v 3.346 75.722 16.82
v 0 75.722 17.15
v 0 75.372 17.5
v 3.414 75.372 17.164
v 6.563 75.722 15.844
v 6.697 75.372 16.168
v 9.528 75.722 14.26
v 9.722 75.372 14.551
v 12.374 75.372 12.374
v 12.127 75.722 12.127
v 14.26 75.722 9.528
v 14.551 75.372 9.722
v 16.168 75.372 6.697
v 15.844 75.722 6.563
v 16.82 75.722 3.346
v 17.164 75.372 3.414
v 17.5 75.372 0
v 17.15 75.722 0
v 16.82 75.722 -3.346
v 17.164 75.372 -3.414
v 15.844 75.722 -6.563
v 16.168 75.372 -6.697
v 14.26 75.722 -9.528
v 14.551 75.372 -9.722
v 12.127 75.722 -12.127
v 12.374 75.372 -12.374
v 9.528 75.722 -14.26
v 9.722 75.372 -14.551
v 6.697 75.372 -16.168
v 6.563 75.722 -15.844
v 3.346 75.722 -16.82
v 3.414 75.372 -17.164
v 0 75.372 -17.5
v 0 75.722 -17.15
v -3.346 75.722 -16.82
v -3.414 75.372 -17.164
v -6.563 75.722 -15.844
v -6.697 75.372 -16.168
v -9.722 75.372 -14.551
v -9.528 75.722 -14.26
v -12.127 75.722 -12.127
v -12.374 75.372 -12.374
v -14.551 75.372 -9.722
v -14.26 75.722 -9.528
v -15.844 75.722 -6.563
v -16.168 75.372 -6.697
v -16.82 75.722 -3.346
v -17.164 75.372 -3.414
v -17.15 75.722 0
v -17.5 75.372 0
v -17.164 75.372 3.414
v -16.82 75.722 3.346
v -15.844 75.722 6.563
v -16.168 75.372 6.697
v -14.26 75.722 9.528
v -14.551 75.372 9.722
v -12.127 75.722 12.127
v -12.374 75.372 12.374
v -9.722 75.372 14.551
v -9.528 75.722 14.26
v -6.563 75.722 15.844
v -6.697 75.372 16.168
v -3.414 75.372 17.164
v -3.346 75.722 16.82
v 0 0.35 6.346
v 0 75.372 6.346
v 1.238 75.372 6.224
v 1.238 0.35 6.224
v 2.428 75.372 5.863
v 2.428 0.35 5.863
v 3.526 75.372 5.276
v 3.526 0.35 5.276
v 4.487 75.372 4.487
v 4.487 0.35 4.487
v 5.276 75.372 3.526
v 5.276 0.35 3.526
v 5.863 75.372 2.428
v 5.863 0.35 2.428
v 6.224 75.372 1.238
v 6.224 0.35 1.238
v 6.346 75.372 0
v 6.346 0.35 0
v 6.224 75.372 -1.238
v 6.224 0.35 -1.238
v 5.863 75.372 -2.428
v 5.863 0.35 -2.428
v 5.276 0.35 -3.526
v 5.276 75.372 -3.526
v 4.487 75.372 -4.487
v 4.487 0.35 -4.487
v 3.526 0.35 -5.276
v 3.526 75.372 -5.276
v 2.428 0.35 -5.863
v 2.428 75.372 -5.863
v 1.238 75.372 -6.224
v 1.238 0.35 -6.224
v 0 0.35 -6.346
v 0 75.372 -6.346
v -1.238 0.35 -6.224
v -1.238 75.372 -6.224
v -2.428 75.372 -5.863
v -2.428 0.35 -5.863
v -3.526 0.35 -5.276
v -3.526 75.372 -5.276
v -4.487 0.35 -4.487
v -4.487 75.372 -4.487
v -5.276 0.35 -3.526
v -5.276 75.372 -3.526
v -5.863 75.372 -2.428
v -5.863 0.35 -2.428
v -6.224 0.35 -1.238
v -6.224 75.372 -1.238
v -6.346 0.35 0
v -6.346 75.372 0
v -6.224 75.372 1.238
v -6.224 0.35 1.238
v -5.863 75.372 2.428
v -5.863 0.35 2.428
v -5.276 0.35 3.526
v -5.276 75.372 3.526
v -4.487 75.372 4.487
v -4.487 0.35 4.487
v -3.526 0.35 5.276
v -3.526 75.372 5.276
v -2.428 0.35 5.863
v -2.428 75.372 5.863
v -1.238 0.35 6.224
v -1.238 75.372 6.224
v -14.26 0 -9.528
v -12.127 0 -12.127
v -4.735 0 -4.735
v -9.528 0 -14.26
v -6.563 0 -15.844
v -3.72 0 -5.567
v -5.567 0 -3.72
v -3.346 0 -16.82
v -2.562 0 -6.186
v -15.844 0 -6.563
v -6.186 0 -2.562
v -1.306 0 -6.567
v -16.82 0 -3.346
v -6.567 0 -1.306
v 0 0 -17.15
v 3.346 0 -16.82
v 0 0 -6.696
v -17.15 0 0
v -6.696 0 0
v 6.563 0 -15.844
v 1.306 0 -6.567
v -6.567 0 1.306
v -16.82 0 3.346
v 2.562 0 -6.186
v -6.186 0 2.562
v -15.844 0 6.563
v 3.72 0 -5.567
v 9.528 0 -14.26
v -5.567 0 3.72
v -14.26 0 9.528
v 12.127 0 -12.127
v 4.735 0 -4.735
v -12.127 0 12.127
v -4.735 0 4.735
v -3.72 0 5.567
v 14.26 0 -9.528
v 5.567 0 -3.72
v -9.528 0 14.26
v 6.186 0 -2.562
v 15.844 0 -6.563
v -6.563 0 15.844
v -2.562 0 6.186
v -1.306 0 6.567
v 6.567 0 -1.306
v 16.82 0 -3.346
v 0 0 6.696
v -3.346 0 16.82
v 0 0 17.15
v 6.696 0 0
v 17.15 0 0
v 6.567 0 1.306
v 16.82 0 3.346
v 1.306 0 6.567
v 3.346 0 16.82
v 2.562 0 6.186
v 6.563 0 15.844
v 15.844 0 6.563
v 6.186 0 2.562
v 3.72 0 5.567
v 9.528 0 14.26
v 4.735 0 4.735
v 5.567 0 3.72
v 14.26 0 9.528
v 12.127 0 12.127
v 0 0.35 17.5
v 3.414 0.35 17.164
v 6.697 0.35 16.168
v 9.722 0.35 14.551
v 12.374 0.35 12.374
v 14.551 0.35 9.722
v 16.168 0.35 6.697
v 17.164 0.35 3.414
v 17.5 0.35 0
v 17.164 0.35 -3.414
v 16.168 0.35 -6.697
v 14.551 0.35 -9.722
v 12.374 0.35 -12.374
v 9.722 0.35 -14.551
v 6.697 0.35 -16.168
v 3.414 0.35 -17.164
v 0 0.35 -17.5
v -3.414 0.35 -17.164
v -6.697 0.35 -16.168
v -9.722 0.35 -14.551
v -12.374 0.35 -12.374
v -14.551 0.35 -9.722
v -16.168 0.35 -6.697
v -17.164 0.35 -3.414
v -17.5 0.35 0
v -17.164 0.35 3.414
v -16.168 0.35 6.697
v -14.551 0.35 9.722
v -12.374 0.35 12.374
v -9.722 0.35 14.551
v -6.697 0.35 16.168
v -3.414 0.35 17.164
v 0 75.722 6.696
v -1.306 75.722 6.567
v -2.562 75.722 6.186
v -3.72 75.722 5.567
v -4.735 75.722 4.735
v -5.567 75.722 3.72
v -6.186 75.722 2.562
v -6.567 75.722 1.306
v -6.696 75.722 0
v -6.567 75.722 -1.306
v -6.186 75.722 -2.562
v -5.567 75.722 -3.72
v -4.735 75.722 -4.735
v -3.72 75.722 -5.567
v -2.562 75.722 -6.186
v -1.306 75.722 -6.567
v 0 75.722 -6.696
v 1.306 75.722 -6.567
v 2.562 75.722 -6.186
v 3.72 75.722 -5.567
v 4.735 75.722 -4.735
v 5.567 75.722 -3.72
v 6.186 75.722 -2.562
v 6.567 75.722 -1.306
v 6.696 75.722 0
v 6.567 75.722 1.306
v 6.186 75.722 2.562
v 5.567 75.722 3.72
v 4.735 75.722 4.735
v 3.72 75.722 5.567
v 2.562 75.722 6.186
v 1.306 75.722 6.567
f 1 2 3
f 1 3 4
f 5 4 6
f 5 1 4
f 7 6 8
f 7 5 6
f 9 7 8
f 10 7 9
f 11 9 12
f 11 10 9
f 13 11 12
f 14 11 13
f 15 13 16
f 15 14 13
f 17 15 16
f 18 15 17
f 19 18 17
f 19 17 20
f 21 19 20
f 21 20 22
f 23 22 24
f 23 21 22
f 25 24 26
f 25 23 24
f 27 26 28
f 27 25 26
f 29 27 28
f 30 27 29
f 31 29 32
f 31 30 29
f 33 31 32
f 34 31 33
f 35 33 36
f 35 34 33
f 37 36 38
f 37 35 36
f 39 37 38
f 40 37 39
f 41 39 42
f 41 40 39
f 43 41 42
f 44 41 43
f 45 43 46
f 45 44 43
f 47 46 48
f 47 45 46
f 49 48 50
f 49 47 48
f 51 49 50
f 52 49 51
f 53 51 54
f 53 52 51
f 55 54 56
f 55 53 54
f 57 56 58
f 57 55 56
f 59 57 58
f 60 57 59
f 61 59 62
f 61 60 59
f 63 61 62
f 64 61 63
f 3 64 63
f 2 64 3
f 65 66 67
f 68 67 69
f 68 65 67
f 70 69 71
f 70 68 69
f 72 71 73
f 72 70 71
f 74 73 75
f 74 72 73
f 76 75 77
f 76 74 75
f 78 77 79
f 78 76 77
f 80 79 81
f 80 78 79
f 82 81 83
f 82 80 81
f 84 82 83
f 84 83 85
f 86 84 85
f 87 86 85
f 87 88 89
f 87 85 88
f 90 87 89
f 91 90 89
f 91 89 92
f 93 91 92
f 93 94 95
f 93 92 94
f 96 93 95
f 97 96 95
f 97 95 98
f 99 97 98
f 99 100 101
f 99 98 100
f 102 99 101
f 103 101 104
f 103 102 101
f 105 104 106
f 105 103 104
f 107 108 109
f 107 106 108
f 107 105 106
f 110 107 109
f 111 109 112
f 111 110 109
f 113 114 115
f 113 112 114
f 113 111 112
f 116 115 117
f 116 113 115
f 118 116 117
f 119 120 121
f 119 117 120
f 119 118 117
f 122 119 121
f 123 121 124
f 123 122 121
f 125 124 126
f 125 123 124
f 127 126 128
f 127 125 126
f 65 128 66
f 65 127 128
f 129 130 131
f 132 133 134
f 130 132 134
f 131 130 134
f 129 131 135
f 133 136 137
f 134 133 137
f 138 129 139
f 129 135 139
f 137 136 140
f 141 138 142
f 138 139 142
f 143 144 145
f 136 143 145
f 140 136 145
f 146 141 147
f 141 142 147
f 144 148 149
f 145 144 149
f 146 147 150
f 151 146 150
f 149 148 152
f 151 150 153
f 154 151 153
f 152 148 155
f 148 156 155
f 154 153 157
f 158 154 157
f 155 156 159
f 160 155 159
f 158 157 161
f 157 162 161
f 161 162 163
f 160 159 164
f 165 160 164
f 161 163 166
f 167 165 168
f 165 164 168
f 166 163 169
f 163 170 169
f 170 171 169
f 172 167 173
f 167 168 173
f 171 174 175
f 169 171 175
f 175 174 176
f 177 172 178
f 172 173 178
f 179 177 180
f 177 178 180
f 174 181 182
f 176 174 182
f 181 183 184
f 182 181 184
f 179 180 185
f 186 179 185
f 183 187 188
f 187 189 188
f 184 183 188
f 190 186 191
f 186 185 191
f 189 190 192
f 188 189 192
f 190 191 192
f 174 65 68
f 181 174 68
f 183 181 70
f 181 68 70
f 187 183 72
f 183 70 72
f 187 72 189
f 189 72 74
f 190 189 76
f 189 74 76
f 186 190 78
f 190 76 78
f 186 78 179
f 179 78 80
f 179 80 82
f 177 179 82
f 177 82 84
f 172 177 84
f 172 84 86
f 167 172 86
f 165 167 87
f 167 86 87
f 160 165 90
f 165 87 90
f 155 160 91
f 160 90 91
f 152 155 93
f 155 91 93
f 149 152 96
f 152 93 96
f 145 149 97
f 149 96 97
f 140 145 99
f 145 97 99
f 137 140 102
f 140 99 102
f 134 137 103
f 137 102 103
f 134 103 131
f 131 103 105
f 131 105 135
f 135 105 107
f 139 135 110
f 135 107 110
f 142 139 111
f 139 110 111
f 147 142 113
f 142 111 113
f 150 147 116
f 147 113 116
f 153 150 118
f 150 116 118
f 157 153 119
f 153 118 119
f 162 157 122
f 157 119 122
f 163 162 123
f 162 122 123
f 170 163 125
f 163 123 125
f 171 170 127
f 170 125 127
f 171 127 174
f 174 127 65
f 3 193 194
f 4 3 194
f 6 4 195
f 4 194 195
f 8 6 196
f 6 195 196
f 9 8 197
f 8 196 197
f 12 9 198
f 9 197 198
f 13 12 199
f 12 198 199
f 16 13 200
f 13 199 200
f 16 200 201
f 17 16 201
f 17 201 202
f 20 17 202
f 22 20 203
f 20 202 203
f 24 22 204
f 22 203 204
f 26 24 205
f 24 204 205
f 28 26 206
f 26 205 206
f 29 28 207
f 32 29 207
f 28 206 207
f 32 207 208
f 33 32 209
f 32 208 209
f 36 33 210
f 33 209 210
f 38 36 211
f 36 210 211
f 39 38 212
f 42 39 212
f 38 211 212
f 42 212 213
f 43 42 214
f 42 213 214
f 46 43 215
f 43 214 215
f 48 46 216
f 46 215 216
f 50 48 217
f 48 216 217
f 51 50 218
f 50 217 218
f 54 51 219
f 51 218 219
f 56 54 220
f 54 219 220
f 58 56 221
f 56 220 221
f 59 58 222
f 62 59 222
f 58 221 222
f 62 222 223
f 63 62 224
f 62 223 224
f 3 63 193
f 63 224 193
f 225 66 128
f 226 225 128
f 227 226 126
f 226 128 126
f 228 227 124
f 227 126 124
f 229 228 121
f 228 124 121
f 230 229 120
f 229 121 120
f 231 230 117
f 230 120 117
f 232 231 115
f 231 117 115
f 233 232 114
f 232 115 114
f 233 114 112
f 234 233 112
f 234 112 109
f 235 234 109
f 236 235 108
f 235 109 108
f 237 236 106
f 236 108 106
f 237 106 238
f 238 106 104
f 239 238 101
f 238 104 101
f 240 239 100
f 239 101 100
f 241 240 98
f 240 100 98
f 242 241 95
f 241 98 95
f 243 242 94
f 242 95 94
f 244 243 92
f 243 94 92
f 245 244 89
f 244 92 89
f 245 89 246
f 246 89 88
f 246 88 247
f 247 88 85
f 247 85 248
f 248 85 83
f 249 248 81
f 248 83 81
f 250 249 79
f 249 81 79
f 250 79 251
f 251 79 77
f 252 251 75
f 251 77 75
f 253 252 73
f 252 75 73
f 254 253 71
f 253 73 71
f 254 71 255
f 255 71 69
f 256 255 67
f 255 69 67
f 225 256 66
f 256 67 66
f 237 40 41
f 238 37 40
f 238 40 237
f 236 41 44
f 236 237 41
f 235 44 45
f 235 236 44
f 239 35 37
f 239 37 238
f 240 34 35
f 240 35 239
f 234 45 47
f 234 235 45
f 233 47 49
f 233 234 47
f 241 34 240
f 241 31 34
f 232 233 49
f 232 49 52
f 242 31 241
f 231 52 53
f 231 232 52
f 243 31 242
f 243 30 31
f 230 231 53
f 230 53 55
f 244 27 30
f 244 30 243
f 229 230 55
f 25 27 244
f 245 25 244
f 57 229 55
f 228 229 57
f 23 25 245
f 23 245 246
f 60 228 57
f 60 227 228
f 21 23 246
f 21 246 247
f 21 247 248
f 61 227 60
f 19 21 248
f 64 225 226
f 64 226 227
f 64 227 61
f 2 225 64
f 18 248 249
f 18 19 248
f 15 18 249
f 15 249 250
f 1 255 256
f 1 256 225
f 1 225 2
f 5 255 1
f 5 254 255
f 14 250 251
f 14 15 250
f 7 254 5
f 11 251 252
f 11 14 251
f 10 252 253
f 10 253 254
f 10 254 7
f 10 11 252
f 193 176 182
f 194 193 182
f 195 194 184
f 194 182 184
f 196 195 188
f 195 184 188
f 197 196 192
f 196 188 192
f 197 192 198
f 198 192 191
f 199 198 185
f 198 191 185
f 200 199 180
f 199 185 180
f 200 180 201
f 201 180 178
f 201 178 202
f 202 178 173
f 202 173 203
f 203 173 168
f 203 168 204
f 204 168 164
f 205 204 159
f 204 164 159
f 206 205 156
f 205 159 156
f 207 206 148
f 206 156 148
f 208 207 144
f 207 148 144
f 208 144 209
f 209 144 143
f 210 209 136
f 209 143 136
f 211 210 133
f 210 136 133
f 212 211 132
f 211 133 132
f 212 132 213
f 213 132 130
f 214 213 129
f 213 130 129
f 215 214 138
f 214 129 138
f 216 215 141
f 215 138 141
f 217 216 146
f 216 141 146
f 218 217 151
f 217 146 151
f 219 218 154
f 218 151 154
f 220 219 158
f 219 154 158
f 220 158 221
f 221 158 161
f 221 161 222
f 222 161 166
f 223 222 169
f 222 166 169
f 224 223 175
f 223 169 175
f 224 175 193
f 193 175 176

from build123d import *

# Parameters (mm, degrees)
SKETCH1_R           = 17.5
BOSS_EXTRUDE1_DEPTH = 75.721727349
SKETCH2_R           = 6.345843567
CUT_EXTRUDE1_DEPTH  = 80.663542432
CHAMFER1_SIZE       = 0.350058037


with BuildPart() as part:
    # Sketch1 → Boss-Extrude1 (new body)
    with BuildSketch(Plane(origin=(0, 0, 0), x_dir=(1, 0, 0), z_dir=(0, 1, 0))):
        Circle(SKETCH1_R)
    extrude(amount=BOSS_EXTRUDE1_DEPTH)

    # Sketch2 → Cut-Extrude1 (cut, through all)
    with BuildSketch(Plane(origin=(0, 0, 0), x_dir=(1, 0, 0), z_dir=(0, 1, 0))):
        Circle(SKETCH2_R)
    extrude(amount=CUT_EXTRUDE1_DEPTH, mode=Mode.SUBTRACT)

    # Chamfer1
    chamfer1_edges = [part.edges().sort_by_distance(p)[0] for p in [
        (-6.345843567, 75.721727349, 0),
        (-6.345843567, 0, 0),
        (-17.5, 0, 0),
        (-17.5, 75.721727349, 0),
    ]]
    chamfer(chamfer1_edges, length=CHAMFER1_SIZE)


solid = part.part
